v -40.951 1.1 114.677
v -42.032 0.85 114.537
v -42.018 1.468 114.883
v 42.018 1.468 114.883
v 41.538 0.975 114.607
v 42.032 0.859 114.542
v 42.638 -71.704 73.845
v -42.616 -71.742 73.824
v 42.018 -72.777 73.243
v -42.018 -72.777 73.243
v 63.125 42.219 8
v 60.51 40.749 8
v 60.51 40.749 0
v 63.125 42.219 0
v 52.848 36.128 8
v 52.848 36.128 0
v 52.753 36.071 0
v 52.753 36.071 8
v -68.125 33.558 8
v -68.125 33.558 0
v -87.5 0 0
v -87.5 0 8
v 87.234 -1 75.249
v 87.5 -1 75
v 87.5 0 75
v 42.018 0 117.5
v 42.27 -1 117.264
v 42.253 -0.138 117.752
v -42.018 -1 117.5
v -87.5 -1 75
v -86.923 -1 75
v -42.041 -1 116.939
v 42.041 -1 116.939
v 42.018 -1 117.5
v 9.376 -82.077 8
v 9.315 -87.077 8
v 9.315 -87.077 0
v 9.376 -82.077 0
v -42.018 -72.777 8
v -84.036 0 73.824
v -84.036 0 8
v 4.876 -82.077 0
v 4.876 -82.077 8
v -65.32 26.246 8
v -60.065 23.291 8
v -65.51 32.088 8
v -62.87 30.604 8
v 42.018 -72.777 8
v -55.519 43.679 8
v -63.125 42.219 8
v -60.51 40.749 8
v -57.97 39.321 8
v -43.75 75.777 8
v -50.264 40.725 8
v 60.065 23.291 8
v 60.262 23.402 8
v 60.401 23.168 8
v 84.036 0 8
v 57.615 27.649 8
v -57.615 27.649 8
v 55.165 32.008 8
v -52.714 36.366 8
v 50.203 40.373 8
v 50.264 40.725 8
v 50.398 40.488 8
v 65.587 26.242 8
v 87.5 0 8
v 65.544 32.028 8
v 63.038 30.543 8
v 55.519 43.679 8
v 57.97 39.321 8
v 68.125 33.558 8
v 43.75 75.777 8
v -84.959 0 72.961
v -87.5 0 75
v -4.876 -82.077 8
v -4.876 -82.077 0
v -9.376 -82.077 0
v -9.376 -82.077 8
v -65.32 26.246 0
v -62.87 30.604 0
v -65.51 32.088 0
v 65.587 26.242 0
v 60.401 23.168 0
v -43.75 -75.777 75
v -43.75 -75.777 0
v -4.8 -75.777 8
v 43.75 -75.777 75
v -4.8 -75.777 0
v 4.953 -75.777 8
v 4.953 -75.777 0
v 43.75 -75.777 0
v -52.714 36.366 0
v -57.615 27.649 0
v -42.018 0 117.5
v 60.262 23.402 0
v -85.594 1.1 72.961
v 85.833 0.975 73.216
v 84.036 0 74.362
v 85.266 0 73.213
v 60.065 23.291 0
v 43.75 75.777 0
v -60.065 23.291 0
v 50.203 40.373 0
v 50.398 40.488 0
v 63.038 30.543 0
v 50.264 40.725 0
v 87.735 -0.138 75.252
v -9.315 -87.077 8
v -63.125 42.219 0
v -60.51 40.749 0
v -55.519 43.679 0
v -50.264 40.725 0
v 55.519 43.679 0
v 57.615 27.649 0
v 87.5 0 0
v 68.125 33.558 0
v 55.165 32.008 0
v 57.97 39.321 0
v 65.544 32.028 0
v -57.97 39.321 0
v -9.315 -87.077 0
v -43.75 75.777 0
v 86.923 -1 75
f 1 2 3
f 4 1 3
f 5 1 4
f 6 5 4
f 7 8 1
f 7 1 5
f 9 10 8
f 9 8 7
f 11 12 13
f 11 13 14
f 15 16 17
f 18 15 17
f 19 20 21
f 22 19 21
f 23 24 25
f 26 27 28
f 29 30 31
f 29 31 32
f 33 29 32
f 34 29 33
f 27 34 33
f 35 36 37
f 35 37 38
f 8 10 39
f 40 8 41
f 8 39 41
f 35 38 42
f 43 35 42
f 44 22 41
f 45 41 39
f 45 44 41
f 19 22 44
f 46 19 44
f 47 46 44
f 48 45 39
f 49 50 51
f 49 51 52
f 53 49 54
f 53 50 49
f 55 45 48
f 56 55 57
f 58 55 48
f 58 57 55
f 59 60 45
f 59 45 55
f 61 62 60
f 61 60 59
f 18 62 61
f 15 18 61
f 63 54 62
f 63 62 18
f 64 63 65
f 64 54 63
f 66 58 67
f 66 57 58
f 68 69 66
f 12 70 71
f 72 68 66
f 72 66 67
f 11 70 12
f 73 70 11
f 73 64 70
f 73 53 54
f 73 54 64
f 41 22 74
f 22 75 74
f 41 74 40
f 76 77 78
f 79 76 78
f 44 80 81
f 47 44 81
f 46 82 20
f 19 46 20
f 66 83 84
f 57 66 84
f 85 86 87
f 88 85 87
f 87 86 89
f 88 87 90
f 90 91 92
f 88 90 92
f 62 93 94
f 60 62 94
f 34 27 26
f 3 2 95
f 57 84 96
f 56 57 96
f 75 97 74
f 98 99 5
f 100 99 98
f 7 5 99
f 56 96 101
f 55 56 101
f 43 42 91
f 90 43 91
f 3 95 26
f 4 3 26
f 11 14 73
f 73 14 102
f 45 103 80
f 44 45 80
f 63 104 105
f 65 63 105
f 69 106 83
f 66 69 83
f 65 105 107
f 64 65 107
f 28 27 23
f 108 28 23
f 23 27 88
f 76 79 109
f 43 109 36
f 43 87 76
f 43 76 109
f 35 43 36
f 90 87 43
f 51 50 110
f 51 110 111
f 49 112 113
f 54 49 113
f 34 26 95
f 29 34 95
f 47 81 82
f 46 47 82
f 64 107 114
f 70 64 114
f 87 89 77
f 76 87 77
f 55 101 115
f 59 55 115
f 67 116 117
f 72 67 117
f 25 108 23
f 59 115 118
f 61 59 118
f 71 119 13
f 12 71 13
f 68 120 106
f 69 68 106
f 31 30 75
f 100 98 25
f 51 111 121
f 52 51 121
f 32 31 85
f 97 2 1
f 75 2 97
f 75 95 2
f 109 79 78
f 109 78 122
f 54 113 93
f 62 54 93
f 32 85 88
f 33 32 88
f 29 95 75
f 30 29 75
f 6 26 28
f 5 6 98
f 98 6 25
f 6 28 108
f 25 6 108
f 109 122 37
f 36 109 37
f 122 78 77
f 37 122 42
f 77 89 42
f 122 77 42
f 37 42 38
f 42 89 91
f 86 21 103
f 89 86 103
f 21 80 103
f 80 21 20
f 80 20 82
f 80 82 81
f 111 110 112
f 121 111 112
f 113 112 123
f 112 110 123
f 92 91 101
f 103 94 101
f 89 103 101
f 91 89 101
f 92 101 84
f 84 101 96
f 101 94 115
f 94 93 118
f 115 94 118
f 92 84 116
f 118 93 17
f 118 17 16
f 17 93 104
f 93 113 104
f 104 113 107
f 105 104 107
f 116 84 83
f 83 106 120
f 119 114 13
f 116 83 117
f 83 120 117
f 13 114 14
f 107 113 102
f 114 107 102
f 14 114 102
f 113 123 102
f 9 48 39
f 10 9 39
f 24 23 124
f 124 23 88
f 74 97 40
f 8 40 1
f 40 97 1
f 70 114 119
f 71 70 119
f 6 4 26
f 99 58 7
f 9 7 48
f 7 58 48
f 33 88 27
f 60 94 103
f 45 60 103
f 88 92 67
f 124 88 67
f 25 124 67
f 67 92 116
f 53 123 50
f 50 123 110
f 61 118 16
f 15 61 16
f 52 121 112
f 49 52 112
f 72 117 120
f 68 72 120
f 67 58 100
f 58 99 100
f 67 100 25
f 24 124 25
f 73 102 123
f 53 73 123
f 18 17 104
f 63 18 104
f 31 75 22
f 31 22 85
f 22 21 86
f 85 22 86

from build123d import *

# Parameters (mm, degrees)
F0_W      = 50
F0_H      = 12.5
F1_DEPTH  = 8
F2_DEPTH  = 75
F4_DEPTH  = 8
F7_DEPTH  = 3
F8_DEPTH  = 1
F11_DEPTH = 3
F14_DEPTH = 3
F15_DEPTH = 8
F16_DEPTH = 25
F17_DEPTH = 8
F18_DEPTH = 8
F19_DEPTH = 8


# Not quite as in the source:
# - a feature names something its author has since deleted; it is built from what else it names


with BuildPart() as f1:
    # F0 (on Top) → F1 (new body)
    with BuildSketch(Plane.XY):
        Polygon((-42.0179491924, 72.7772228311), (-60.5095952989, 40.7487522591), (-57.9695070384, 39.3207329262), (-55.5194165334, 43.6791064608), (-50.2642610162, 40.7248836223), (-52.7144317239, 36.366367418), (-57.615009792, 27.6494680496), (-60.0654171506, 23.2910848888), (-65.3204122546, 26.2455930623), (-62.870004896, 30.6039762231), (-65.5097997054, 32.0881441788), (-84.0358983849, 0), (-42.0179491924, -72.7772228311), (42.0179491924, -72.7772228311), (84.0358983849, 0), (65.5442522784, 32.028470572), (63.0375071287, 30.542699277), (65.5869240764, 26.2416718908), (60.4009142911, 23.1676851313), (60.2621924773, 23.4017175915), (60.0654171506, 23.2910848888), (57.615009792, 27.6494680496), (55.164720758, 32.0079177338), (52.8483970279, 36.1280767392), (52.7526466281, 36.0713280944), (50.2033797707, 40.372634697), (50.3975781651, 40.4877307774), (50.2642610162, 40.7248836223), (55.5194165334, 43.6791064608), (57.9695070384, 39.3207329262), (60.5095952989, 40.7487522591), (42.0179491924, 72.7772228311), align=None)
        with Locations((0, 54.5829171234)):
            Rectangle(F0_W, F0_H, mode=Mode.SUBTRACT)
    extrude(amount=F1_DEPTH)

    # F0 (on Top) → F2 (join)
    with BuildSketch(Plane.XY):
        Polygon((-84.0358983849, 0), (-87.5, 0), (-43.75, -75.7772228311), (-4.799692811, -75.7772228311), (4.9533583678, -75.7772228311), (43.75, -75.7772228311), (87.5, 0), (84.0358983849, 0), (42.0179491924, -72.7772228311), (-42.0179491924, -72.7772228311), align=None)
    extrude(amount=F2_DEPTH)

    # F0 (on Top) → F4 (join)
    with BuildSketch(Plane.XY):
        Polygon((43.75, 75.7772228311), (-43.75, 75.7772228311), (-63.1248363216, 42.2190219338), (-60.5095952989, 40.7487522591), (-42.0179491924, 72.7772228311), (42.0179491924, 72.7772228311), (60.5095952989, 40.7487522591), (63.1248363216, 42.2190219338), align=None)
    extrude(amount=F4_DEPTH)

    # F6 (on face) → F7 (join)
    with BuildSketch(Plane(origin=(0, -50.1312366318, 89.3836679776), x_dir=(1, 0, 0), z_dir=(0, 0.4891706574, -0.872188092))):
        Polygon((43.75, 29.4041920927), (0, 29.4041920927), (-43.75, 29.4041920927), (-42.01795, -57.4775522498), (42.01795, -57.4775522498), align=None)
    extrude(amount=F7_DEPTH)

    # F3 (on Front) → F8 (join)
    with BuildSketch(Plane.XZ):
        Polygon((-42.01795, 114.5), (0, 114.5), (42.01795, 114.5), (84.0359, 75), (87.5, 75), (42.01795, 117.5), (0, 117.5), (-42.01795, 117.5), (-87.5, 75), (-84.0359, 75), align=None)
    extrude(amount=F8_DEPTH)

    # F10 (on face) → F11 (join)
    with BuildSketch(Plane(origin=(-67.6846727043, -39.0777640058, 72.4338274863), x_dir=(0.7723629594, -0.3015876344, 0.5590173143), z_dir=(-0.6351814378, -0.3667221741, 0.6797495039))):
        Polygon((33.2314262259, 55.789645187), (-25.6554603702, 35.6104118215), (30.9888924807, -31.0804218073), align=None)
    extrude(amount=-F11_DEPTH)

    # F13 (on face) → F14 (join)
    with BuildSketch(Plane(origin=(67.6756688636, -39.5950852503, 72.4241918832), x_dir=(0.7733047167, 0.3041472681, -0.556322078), z_dir=(-0.6340345536, 0.3709553614, -0.6785221475))):
        Polygon((-30.939509805, 30.5117392321), (-32.8751652468, -56.3649154418), (25.9400068576, -35.9776056011), align=None)
    extrude(amount=F14_DEPTH)

    # F0 (on Top) → F15 (join)
    with BuildSketch(Plane.XY):
        with Locations((0, 54.5829171234)):
            Rectangle(F0_W, F0_H)
    extrude(amount=F15_DEPTH)

    # F0 (on Top) → F16 (cut)
    with BuildSketch(Plane.XY):
        Polygon((-57.9695070384, 39.3207329262), (-60.5095952989, 40.7487522591), (-65.5097997054, 32.0881441788), (-62.870004896, 30.6039762231), (-57.615009792, 27.6494680496), (-52.7144317239, 36.366367418), align=None)
    extrude(amount=-F16_DEPTH, mode=Mode.SUBTRACT)

    # F0 (on Top) → F17 (join)
    with BuildSketch(Plane.XY):
        Polygon((-65.5097997054, 32.0881441788), (-68.125, 33.5584843966), (-87.5, 0), (-84.0358983849, 0), align=None)
        Polygon((87.5, 0), (68.1251636784, 33.5582008974), (65.5442522784, 32.028470572), (84.0358983849, 0), align=None)
    extrude(amount=F17_DEPTH)

    # F0 (on Top) → F18 (join)
    with BuildSketch(Plane.XY):
        Polygon((4.9533583678, -75.7772228311), (-4.799692811, -75.7772228311), (-4.8760764436, -82.0772228311), (-4.9366983742, -87.0772228311), (-4.8147415831, -87.0772228311), (4.8147415831, -87.0772228311), (4.8760764436, -82.0772228311), align=None)
        Polygon((9.3760764436, -82.0772228311), (4.8760764436, -82.0772228311), (4.8147415831, -87.0772228311), (9.3147415831, -87.0772228311), align=None)
    extrude(amount=F18_DEPTH)

    # F0 (on Top) → F19 (join)
    with BuildSketch(Plane.XY):
        Polygon((-4.9366983742, -87.0772228311), (-4.8760764436, -82.0772228311), (-9.3760764436, -82.0772228311), (-9.3147415831, -87.0772228311), align=None)
    extrude(amount=F19_DEPTH)


solid = f1.part
